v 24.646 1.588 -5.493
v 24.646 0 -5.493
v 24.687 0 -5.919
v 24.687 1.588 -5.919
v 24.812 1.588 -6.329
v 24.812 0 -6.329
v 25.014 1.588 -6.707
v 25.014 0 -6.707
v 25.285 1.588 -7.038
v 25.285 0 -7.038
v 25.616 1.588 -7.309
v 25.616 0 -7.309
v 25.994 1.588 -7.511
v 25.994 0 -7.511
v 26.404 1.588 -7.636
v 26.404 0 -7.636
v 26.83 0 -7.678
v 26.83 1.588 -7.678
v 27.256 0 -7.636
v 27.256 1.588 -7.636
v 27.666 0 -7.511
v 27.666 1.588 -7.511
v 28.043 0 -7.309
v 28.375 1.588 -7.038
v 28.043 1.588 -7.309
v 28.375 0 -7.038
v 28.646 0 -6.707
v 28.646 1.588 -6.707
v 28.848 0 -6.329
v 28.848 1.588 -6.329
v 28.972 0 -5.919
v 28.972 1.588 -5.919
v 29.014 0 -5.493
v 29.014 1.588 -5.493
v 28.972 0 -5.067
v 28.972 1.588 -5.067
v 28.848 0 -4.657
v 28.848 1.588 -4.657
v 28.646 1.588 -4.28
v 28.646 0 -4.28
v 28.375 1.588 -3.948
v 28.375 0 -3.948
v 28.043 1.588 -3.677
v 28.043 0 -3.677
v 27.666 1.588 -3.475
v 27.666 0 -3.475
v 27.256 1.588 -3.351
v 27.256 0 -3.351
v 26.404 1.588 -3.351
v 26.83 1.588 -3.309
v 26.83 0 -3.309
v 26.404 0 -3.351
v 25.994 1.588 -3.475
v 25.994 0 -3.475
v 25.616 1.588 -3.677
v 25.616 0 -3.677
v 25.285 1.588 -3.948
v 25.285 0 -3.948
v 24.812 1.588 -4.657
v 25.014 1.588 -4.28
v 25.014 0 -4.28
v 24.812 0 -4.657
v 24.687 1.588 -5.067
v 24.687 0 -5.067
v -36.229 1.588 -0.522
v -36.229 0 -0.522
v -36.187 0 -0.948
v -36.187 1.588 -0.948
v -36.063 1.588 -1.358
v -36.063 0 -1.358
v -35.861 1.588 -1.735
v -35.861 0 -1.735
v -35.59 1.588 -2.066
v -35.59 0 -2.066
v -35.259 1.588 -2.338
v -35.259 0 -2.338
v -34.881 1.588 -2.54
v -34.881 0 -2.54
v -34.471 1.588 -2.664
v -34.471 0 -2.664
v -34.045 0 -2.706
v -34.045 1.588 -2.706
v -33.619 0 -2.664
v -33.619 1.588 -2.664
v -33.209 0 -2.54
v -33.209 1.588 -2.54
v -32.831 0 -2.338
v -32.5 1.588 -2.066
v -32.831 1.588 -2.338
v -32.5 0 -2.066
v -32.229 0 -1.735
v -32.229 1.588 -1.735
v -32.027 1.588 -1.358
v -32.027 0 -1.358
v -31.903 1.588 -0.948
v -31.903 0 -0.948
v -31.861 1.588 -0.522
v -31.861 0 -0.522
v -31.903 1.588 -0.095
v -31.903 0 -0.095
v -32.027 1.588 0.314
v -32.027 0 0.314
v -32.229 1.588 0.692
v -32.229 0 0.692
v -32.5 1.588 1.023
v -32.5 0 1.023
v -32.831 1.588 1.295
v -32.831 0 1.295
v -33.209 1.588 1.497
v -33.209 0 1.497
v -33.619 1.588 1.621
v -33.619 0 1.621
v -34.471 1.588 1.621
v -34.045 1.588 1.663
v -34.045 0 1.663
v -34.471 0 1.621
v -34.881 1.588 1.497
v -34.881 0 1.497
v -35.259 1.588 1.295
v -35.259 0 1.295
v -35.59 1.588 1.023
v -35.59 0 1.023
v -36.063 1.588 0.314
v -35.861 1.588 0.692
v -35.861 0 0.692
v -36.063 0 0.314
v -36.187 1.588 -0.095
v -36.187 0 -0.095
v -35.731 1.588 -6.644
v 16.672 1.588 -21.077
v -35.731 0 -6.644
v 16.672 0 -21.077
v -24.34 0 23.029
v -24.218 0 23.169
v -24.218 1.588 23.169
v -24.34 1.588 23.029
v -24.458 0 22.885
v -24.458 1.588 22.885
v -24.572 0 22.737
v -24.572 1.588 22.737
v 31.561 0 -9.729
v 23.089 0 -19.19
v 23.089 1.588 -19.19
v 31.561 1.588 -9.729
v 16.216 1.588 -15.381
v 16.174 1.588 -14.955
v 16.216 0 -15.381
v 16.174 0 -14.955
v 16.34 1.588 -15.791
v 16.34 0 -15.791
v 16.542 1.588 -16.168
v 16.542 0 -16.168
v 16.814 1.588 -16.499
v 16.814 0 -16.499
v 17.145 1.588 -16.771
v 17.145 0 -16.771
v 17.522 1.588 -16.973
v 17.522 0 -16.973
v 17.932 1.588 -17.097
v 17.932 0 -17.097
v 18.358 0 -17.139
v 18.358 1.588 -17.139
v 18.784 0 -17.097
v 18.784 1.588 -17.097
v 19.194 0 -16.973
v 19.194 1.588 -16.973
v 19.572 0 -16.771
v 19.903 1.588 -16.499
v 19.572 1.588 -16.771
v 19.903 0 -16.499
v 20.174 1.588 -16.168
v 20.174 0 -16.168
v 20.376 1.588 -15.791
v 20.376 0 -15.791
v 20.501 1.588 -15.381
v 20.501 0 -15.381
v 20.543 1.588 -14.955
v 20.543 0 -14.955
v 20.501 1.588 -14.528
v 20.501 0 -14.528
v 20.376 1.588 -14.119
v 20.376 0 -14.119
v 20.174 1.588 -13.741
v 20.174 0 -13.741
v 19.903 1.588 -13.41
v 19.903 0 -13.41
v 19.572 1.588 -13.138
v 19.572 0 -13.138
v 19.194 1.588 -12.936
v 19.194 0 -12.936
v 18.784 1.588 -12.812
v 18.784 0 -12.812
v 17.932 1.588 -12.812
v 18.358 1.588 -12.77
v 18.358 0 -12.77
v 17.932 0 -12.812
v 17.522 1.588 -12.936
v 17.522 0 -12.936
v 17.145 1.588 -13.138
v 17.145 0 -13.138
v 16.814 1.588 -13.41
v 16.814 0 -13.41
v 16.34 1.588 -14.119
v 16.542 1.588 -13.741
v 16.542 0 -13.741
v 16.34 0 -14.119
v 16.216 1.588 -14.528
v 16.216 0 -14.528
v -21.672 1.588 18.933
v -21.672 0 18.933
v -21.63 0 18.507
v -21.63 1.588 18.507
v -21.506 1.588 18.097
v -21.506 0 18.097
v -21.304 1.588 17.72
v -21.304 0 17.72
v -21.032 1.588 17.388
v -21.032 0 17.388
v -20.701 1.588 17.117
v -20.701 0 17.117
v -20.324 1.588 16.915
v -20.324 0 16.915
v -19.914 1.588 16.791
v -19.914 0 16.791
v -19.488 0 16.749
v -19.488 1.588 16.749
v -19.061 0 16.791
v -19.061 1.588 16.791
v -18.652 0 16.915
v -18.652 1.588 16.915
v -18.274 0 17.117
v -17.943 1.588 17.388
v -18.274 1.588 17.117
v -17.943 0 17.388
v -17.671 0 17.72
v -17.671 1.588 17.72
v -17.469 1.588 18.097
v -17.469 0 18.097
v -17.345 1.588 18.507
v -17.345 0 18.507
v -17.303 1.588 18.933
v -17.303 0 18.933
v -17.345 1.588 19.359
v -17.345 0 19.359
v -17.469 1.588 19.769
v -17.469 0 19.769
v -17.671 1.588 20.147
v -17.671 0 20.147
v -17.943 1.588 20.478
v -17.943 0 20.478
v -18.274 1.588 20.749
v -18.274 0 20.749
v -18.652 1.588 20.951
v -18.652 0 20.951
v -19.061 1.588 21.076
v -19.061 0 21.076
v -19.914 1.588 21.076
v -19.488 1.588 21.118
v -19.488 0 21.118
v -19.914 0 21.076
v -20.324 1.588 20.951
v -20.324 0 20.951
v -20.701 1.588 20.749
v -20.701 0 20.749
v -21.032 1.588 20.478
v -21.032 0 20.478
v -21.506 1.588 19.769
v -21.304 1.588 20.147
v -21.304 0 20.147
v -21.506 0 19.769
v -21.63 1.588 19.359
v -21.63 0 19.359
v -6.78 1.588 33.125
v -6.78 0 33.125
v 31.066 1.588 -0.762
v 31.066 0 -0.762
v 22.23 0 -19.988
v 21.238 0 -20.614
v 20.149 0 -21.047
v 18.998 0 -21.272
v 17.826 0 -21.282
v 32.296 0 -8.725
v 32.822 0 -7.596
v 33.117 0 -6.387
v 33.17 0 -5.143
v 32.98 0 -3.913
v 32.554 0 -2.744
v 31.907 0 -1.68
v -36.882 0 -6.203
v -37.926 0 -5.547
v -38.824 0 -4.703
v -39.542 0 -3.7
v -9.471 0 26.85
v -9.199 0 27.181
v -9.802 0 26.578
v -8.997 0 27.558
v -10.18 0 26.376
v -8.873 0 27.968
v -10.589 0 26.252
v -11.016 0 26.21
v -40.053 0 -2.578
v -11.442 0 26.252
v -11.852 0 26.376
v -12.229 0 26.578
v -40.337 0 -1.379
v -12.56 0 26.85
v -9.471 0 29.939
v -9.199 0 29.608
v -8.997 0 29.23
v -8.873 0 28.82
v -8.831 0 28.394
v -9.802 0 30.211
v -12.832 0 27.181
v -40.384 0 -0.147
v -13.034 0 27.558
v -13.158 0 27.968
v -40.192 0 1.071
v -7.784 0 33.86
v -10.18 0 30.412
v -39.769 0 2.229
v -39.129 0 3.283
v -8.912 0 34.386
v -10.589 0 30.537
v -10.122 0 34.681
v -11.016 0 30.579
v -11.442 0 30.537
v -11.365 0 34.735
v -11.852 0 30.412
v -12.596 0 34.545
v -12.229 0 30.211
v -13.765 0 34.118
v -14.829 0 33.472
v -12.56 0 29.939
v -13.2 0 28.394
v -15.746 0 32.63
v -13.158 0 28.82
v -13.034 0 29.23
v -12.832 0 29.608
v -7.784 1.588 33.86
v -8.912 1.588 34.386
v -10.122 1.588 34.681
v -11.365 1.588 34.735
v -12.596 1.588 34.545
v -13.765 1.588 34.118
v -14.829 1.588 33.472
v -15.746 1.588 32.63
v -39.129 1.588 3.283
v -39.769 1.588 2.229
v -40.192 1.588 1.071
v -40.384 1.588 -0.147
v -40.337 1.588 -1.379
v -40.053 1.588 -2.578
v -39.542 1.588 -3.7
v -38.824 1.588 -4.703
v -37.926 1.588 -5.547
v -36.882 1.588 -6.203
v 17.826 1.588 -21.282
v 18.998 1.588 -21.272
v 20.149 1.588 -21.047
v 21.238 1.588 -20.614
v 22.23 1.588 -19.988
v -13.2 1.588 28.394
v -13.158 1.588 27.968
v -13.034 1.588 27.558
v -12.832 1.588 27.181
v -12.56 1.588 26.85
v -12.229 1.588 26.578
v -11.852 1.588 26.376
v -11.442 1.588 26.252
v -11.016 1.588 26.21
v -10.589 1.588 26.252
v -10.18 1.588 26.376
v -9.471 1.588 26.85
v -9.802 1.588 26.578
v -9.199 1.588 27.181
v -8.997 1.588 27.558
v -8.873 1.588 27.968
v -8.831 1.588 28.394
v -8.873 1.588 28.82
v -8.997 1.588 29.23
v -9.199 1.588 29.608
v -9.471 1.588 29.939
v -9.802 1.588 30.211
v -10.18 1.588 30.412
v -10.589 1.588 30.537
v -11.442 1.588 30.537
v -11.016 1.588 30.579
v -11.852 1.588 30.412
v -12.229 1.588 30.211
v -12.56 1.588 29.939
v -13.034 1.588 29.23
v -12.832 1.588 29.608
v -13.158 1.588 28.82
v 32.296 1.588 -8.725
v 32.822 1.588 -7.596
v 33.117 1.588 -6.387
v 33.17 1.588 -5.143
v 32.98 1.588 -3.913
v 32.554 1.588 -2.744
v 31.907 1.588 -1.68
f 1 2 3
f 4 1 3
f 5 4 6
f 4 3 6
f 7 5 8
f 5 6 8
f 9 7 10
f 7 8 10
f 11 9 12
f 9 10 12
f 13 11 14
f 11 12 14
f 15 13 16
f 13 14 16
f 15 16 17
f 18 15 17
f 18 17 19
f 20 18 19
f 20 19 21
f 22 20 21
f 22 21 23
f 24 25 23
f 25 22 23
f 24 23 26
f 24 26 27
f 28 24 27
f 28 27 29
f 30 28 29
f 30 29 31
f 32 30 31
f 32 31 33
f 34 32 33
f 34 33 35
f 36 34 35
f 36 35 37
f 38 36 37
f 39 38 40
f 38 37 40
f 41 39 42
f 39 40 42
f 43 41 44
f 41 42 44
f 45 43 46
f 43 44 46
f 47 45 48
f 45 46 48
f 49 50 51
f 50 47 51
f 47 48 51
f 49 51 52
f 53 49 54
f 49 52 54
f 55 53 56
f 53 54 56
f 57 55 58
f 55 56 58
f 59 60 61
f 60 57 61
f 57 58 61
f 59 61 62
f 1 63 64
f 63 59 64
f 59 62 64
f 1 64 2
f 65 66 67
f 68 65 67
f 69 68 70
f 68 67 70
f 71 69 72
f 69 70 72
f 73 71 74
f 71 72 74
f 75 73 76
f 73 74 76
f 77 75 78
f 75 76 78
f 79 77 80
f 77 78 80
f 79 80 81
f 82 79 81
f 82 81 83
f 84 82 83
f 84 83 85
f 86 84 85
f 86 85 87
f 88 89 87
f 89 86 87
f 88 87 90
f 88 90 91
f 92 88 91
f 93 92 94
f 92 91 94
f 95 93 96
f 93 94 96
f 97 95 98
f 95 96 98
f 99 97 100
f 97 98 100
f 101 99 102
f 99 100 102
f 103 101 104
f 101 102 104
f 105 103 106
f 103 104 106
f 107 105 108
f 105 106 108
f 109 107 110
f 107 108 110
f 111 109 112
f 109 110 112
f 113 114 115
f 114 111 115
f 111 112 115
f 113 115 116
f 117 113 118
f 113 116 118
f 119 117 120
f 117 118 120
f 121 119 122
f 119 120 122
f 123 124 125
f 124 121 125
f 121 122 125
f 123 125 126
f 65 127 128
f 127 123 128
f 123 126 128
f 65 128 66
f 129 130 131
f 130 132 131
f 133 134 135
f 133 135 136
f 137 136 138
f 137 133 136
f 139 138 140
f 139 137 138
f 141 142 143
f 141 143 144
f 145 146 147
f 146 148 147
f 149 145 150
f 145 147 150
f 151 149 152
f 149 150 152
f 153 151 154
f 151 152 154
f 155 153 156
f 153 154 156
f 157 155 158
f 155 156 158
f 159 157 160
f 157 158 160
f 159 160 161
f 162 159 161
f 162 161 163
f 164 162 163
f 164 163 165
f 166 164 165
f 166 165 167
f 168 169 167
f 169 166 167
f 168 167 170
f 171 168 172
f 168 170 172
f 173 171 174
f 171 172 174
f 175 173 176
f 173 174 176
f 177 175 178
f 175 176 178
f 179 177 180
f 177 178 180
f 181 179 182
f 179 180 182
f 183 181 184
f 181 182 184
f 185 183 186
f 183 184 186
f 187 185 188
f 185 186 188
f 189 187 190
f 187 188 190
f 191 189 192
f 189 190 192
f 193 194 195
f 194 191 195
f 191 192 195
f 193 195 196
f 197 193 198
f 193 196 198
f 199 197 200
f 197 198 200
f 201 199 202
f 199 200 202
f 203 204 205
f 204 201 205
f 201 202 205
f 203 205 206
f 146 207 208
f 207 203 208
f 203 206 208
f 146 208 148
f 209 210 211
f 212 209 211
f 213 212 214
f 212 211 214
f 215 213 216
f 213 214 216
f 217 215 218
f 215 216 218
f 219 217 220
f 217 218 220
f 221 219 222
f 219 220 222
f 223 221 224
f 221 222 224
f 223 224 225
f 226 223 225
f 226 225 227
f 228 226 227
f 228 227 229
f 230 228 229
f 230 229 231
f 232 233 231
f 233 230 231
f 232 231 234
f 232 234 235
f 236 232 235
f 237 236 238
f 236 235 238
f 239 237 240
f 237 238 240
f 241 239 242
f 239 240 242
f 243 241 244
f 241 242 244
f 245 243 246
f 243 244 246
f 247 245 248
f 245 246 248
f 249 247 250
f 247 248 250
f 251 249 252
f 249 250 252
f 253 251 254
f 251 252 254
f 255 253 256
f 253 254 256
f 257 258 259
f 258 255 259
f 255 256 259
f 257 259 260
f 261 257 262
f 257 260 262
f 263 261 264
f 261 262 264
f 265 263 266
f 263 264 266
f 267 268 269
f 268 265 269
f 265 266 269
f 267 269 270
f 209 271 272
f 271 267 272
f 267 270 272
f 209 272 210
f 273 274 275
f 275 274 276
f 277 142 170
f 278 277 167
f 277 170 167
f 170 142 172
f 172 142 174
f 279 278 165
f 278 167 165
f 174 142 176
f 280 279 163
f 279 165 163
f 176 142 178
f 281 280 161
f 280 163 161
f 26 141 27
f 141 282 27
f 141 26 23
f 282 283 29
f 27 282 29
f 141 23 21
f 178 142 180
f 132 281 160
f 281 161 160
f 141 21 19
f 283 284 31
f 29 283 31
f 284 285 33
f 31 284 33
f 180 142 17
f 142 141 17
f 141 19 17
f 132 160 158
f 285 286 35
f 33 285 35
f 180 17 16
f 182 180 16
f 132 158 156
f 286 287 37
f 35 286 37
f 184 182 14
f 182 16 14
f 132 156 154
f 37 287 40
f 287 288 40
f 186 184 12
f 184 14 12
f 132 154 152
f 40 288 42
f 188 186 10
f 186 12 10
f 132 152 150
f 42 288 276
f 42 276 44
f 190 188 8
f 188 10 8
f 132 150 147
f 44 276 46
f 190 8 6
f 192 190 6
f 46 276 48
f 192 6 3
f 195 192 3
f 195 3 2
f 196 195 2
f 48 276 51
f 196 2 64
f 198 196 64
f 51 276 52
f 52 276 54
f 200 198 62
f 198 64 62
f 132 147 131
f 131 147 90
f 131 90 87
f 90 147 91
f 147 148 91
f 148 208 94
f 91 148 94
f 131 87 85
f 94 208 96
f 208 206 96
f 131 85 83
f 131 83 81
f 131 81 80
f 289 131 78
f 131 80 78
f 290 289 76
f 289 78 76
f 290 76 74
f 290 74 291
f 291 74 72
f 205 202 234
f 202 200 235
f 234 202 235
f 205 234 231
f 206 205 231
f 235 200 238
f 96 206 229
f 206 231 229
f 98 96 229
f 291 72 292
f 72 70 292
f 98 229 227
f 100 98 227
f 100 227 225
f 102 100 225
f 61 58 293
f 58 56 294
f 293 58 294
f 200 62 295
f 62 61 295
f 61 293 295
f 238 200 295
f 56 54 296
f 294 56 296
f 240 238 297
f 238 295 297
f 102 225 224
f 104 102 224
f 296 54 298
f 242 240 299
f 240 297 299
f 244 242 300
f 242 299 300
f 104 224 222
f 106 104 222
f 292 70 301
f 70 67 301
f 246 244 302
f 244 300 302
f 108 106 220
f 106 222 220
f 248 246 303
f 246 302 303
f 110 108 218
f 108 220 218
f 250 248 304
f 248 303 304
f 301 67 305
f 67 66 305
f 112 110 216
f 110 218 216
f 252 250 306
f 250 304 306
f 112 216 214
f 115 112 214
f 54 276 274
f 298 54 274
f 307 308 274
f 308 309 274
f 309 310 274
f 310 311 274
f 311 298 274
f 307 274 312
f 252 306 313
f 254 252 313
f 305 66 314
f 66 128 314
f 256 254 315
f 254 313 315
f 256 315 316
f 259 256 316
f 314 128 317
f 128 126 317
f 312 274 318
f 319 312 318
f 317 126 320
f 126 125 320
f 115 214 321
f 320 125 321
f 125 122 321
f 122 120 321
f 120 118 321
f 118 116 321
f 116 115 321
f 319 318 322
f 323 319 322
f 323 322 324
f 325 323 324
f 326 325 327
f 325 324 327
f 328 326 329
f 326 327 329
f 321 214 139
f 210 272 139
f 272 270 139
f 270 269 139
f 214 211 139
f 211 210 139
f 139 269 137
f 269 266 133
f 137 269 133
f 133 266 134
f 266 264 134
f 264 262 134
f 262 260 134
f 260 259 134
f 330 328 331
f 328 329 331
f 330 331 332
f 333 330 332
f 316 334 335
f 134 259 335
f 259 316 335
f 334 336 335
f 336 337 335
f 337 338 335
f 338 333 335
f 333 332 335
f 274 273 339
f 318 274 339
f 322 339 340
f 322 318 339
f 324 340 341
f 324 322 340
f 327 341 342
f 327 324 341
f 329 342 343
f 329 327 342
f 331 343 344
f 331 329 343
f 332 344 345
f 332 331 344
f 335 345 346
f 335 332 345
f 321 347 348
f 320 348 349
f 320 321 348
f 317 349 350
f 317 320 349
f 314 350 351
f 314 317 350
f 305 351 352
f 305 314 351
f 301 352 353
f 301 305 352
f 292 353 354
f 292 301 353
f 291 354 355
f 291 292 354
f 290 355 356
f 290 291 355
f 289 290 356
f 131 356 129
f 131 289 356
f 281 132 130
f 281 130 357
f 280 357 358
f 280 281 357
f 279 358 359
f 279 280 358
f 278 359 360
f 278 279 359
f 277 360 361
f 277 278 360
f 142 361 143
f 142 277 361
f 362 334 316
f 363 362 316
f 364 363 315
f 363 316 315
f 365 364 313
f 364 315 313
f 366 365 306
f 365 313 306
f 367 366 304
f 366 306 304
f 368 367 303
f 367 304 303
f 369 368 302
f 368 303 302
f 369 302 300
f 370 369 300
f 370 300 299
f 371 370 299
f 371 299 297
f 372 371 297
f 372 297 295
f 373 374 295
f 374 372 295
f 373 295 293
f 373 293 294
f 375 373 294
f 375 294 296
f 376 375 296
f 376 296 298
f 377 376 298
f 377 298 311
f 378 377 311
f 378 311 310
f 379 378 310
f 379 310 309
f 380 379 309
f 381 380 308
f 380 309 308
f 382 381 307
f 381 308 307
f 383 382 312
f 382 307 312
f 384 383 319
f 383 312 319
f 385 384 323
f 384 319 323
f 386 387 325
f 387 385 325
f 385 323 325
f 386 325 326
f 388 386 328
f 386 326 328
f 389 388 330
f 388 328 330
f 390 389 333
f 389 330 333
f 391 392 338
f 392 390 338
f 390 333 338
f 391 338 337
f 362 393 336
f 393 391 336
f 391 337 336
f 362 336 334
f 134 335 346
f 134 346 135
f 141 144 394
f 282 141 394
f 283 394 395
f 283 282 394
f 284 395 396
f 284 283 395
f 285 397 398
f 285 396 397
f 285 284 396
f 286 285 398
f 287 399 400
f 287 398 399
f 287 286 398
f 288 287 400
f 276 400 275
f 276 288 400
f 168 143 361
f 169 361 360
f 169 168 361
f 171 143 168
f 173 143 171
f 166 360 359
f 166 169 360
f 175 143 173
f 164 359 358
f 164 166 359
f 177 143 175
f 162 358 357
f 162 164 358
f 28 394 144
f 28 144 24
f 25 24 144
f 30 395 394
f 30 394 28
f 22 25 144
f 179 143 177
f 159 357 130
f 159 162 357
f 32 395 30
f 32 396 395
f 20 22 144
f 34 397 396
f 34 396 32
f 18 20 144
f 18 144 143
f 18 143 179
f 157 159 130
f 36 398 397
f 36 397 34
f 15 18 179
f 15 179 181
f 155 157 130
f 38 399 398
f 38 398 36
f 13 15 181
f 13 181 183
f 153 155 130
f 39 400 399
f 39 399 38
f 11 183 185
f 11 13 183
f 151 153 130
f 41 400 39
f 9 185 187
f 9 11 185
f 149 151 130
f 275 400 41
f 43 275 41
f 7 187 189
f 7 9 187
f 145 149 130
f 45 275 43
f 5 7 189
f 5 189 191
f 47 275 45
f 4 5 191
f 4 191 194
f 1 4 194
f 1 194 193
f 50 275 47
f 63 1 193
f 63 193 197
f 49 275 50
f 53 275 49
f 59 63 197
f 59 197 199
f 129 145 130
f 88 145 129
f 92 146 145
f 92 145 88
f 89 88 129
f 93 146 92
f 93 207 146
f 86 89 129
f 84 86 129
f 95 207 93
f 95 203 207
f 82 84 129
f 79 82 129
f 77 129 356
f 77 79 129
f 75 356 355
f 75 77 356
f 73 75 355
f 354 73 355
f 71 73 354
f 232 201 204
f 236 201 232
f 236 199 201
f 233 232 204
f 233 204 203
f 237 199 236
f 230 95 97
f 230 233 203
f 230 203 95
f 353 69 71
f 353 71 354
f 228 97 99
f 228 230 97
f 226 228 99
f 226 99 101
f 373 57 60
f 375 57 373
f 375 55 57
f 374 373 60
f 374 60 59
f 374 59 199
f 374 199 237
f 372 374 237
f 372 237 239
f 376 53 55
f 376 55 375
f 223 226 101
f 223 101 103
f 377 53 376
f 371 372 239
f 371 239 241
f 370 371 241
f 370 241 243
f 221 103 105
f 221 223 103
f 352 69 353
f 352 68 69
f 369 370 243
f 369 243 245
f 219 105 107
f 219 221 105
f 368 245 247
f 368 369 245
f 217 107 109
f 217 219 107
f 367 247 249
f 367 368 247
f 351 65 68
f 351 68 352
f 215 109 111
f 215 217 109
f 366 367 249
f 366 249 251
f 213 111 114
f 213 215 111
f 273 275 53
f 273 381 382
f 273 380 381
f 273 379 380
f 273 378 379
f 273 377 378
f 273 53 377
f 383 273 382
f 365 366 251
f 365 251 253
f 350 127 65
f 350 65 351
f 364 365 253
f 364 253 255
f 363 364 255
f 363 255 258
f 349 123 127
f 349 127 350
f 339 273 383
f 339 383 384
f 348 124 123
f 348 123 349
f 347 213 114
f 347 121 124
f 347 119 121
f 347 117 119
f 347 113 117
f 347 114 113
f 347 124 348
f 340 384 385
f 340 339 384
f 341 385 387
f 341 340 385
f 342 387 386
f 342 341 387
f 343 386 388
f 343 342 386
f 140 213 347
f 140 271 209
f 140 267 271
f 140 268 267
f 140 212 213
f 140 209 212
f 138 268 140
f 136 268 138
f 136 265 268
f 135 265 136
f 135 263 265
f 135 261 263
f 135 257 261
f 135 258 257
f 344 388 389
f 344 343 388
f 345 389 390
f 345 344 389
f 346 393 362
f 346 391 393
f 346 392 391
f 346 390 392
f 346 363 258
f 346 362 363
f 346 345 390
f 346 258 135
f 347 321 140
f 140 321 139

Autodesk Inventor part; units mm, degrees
ref_plane "YZ Plane" through (0, 0, 0) normal (1, 0, 0) x (0, 1, 0)
ref_plane "XZ Plane" through (0, 0, 0) normal (0, 1, 0) x (-1, 0, 0)
ref_plane "XY Plane" through (0, 0, 0) normal (0, 0, 1) x (1, 0, 0)
sketch "Sketch1" plane through (0, 0, 0) normal (0, 1, 0) x (-1, 0, 0)
  circle A0 centre (-18.3582, -14.9546) radius 2.1844
  circle A1 centre (-26.8299, -5.4931) radius 2.1844
  circle A2 centre (34.045, -0.5216) radius 2.1844
  circle A3 centre (19.4876, 18.9331) radius 2.1844
  circle A4 centre (11.0156, 28.3943) radius 2.1844
  circle A5 centre (-18.3582, -14.9546) radius 6.35
  circle A6 centre (19.4876, 18.9331) radius 6.35
  circle A7 centre (34.045, -0.5216) radius 6.35
  circle A8 centre (11.0156, 28.3943) radius 6.35
  circle A9 centre (-26.8299, -5.4931) radius 6.35
  line L0 (6.7797, 33.125) -> (-31.0658, -0.7624)
  line L1 (15.7462, 32.6303) -> (24.2182, 23.1691)
  line L2 (-23.0889, -19.1904) -> (-31.5606, -9.729)
  line L3 (-16.672, -21.0766) -> (35.7311, -6.6437)
  line L4 (39.1292, 3.2827) -> (24.5718, 22.7374)
  point P0 (0, 0)
  dimension "d0" = 4.3688
  dimension "d1" = 4.3688
  dimension "d2" = 4.3688
  dimension "d3" = 12.7
  dimension "d4" = 12.7
  dimension "d5" = 12.7
extrude "Extrusion1" add sketch "Sketch1" along normal blind 1.5875
properties part number "stackBrace"
